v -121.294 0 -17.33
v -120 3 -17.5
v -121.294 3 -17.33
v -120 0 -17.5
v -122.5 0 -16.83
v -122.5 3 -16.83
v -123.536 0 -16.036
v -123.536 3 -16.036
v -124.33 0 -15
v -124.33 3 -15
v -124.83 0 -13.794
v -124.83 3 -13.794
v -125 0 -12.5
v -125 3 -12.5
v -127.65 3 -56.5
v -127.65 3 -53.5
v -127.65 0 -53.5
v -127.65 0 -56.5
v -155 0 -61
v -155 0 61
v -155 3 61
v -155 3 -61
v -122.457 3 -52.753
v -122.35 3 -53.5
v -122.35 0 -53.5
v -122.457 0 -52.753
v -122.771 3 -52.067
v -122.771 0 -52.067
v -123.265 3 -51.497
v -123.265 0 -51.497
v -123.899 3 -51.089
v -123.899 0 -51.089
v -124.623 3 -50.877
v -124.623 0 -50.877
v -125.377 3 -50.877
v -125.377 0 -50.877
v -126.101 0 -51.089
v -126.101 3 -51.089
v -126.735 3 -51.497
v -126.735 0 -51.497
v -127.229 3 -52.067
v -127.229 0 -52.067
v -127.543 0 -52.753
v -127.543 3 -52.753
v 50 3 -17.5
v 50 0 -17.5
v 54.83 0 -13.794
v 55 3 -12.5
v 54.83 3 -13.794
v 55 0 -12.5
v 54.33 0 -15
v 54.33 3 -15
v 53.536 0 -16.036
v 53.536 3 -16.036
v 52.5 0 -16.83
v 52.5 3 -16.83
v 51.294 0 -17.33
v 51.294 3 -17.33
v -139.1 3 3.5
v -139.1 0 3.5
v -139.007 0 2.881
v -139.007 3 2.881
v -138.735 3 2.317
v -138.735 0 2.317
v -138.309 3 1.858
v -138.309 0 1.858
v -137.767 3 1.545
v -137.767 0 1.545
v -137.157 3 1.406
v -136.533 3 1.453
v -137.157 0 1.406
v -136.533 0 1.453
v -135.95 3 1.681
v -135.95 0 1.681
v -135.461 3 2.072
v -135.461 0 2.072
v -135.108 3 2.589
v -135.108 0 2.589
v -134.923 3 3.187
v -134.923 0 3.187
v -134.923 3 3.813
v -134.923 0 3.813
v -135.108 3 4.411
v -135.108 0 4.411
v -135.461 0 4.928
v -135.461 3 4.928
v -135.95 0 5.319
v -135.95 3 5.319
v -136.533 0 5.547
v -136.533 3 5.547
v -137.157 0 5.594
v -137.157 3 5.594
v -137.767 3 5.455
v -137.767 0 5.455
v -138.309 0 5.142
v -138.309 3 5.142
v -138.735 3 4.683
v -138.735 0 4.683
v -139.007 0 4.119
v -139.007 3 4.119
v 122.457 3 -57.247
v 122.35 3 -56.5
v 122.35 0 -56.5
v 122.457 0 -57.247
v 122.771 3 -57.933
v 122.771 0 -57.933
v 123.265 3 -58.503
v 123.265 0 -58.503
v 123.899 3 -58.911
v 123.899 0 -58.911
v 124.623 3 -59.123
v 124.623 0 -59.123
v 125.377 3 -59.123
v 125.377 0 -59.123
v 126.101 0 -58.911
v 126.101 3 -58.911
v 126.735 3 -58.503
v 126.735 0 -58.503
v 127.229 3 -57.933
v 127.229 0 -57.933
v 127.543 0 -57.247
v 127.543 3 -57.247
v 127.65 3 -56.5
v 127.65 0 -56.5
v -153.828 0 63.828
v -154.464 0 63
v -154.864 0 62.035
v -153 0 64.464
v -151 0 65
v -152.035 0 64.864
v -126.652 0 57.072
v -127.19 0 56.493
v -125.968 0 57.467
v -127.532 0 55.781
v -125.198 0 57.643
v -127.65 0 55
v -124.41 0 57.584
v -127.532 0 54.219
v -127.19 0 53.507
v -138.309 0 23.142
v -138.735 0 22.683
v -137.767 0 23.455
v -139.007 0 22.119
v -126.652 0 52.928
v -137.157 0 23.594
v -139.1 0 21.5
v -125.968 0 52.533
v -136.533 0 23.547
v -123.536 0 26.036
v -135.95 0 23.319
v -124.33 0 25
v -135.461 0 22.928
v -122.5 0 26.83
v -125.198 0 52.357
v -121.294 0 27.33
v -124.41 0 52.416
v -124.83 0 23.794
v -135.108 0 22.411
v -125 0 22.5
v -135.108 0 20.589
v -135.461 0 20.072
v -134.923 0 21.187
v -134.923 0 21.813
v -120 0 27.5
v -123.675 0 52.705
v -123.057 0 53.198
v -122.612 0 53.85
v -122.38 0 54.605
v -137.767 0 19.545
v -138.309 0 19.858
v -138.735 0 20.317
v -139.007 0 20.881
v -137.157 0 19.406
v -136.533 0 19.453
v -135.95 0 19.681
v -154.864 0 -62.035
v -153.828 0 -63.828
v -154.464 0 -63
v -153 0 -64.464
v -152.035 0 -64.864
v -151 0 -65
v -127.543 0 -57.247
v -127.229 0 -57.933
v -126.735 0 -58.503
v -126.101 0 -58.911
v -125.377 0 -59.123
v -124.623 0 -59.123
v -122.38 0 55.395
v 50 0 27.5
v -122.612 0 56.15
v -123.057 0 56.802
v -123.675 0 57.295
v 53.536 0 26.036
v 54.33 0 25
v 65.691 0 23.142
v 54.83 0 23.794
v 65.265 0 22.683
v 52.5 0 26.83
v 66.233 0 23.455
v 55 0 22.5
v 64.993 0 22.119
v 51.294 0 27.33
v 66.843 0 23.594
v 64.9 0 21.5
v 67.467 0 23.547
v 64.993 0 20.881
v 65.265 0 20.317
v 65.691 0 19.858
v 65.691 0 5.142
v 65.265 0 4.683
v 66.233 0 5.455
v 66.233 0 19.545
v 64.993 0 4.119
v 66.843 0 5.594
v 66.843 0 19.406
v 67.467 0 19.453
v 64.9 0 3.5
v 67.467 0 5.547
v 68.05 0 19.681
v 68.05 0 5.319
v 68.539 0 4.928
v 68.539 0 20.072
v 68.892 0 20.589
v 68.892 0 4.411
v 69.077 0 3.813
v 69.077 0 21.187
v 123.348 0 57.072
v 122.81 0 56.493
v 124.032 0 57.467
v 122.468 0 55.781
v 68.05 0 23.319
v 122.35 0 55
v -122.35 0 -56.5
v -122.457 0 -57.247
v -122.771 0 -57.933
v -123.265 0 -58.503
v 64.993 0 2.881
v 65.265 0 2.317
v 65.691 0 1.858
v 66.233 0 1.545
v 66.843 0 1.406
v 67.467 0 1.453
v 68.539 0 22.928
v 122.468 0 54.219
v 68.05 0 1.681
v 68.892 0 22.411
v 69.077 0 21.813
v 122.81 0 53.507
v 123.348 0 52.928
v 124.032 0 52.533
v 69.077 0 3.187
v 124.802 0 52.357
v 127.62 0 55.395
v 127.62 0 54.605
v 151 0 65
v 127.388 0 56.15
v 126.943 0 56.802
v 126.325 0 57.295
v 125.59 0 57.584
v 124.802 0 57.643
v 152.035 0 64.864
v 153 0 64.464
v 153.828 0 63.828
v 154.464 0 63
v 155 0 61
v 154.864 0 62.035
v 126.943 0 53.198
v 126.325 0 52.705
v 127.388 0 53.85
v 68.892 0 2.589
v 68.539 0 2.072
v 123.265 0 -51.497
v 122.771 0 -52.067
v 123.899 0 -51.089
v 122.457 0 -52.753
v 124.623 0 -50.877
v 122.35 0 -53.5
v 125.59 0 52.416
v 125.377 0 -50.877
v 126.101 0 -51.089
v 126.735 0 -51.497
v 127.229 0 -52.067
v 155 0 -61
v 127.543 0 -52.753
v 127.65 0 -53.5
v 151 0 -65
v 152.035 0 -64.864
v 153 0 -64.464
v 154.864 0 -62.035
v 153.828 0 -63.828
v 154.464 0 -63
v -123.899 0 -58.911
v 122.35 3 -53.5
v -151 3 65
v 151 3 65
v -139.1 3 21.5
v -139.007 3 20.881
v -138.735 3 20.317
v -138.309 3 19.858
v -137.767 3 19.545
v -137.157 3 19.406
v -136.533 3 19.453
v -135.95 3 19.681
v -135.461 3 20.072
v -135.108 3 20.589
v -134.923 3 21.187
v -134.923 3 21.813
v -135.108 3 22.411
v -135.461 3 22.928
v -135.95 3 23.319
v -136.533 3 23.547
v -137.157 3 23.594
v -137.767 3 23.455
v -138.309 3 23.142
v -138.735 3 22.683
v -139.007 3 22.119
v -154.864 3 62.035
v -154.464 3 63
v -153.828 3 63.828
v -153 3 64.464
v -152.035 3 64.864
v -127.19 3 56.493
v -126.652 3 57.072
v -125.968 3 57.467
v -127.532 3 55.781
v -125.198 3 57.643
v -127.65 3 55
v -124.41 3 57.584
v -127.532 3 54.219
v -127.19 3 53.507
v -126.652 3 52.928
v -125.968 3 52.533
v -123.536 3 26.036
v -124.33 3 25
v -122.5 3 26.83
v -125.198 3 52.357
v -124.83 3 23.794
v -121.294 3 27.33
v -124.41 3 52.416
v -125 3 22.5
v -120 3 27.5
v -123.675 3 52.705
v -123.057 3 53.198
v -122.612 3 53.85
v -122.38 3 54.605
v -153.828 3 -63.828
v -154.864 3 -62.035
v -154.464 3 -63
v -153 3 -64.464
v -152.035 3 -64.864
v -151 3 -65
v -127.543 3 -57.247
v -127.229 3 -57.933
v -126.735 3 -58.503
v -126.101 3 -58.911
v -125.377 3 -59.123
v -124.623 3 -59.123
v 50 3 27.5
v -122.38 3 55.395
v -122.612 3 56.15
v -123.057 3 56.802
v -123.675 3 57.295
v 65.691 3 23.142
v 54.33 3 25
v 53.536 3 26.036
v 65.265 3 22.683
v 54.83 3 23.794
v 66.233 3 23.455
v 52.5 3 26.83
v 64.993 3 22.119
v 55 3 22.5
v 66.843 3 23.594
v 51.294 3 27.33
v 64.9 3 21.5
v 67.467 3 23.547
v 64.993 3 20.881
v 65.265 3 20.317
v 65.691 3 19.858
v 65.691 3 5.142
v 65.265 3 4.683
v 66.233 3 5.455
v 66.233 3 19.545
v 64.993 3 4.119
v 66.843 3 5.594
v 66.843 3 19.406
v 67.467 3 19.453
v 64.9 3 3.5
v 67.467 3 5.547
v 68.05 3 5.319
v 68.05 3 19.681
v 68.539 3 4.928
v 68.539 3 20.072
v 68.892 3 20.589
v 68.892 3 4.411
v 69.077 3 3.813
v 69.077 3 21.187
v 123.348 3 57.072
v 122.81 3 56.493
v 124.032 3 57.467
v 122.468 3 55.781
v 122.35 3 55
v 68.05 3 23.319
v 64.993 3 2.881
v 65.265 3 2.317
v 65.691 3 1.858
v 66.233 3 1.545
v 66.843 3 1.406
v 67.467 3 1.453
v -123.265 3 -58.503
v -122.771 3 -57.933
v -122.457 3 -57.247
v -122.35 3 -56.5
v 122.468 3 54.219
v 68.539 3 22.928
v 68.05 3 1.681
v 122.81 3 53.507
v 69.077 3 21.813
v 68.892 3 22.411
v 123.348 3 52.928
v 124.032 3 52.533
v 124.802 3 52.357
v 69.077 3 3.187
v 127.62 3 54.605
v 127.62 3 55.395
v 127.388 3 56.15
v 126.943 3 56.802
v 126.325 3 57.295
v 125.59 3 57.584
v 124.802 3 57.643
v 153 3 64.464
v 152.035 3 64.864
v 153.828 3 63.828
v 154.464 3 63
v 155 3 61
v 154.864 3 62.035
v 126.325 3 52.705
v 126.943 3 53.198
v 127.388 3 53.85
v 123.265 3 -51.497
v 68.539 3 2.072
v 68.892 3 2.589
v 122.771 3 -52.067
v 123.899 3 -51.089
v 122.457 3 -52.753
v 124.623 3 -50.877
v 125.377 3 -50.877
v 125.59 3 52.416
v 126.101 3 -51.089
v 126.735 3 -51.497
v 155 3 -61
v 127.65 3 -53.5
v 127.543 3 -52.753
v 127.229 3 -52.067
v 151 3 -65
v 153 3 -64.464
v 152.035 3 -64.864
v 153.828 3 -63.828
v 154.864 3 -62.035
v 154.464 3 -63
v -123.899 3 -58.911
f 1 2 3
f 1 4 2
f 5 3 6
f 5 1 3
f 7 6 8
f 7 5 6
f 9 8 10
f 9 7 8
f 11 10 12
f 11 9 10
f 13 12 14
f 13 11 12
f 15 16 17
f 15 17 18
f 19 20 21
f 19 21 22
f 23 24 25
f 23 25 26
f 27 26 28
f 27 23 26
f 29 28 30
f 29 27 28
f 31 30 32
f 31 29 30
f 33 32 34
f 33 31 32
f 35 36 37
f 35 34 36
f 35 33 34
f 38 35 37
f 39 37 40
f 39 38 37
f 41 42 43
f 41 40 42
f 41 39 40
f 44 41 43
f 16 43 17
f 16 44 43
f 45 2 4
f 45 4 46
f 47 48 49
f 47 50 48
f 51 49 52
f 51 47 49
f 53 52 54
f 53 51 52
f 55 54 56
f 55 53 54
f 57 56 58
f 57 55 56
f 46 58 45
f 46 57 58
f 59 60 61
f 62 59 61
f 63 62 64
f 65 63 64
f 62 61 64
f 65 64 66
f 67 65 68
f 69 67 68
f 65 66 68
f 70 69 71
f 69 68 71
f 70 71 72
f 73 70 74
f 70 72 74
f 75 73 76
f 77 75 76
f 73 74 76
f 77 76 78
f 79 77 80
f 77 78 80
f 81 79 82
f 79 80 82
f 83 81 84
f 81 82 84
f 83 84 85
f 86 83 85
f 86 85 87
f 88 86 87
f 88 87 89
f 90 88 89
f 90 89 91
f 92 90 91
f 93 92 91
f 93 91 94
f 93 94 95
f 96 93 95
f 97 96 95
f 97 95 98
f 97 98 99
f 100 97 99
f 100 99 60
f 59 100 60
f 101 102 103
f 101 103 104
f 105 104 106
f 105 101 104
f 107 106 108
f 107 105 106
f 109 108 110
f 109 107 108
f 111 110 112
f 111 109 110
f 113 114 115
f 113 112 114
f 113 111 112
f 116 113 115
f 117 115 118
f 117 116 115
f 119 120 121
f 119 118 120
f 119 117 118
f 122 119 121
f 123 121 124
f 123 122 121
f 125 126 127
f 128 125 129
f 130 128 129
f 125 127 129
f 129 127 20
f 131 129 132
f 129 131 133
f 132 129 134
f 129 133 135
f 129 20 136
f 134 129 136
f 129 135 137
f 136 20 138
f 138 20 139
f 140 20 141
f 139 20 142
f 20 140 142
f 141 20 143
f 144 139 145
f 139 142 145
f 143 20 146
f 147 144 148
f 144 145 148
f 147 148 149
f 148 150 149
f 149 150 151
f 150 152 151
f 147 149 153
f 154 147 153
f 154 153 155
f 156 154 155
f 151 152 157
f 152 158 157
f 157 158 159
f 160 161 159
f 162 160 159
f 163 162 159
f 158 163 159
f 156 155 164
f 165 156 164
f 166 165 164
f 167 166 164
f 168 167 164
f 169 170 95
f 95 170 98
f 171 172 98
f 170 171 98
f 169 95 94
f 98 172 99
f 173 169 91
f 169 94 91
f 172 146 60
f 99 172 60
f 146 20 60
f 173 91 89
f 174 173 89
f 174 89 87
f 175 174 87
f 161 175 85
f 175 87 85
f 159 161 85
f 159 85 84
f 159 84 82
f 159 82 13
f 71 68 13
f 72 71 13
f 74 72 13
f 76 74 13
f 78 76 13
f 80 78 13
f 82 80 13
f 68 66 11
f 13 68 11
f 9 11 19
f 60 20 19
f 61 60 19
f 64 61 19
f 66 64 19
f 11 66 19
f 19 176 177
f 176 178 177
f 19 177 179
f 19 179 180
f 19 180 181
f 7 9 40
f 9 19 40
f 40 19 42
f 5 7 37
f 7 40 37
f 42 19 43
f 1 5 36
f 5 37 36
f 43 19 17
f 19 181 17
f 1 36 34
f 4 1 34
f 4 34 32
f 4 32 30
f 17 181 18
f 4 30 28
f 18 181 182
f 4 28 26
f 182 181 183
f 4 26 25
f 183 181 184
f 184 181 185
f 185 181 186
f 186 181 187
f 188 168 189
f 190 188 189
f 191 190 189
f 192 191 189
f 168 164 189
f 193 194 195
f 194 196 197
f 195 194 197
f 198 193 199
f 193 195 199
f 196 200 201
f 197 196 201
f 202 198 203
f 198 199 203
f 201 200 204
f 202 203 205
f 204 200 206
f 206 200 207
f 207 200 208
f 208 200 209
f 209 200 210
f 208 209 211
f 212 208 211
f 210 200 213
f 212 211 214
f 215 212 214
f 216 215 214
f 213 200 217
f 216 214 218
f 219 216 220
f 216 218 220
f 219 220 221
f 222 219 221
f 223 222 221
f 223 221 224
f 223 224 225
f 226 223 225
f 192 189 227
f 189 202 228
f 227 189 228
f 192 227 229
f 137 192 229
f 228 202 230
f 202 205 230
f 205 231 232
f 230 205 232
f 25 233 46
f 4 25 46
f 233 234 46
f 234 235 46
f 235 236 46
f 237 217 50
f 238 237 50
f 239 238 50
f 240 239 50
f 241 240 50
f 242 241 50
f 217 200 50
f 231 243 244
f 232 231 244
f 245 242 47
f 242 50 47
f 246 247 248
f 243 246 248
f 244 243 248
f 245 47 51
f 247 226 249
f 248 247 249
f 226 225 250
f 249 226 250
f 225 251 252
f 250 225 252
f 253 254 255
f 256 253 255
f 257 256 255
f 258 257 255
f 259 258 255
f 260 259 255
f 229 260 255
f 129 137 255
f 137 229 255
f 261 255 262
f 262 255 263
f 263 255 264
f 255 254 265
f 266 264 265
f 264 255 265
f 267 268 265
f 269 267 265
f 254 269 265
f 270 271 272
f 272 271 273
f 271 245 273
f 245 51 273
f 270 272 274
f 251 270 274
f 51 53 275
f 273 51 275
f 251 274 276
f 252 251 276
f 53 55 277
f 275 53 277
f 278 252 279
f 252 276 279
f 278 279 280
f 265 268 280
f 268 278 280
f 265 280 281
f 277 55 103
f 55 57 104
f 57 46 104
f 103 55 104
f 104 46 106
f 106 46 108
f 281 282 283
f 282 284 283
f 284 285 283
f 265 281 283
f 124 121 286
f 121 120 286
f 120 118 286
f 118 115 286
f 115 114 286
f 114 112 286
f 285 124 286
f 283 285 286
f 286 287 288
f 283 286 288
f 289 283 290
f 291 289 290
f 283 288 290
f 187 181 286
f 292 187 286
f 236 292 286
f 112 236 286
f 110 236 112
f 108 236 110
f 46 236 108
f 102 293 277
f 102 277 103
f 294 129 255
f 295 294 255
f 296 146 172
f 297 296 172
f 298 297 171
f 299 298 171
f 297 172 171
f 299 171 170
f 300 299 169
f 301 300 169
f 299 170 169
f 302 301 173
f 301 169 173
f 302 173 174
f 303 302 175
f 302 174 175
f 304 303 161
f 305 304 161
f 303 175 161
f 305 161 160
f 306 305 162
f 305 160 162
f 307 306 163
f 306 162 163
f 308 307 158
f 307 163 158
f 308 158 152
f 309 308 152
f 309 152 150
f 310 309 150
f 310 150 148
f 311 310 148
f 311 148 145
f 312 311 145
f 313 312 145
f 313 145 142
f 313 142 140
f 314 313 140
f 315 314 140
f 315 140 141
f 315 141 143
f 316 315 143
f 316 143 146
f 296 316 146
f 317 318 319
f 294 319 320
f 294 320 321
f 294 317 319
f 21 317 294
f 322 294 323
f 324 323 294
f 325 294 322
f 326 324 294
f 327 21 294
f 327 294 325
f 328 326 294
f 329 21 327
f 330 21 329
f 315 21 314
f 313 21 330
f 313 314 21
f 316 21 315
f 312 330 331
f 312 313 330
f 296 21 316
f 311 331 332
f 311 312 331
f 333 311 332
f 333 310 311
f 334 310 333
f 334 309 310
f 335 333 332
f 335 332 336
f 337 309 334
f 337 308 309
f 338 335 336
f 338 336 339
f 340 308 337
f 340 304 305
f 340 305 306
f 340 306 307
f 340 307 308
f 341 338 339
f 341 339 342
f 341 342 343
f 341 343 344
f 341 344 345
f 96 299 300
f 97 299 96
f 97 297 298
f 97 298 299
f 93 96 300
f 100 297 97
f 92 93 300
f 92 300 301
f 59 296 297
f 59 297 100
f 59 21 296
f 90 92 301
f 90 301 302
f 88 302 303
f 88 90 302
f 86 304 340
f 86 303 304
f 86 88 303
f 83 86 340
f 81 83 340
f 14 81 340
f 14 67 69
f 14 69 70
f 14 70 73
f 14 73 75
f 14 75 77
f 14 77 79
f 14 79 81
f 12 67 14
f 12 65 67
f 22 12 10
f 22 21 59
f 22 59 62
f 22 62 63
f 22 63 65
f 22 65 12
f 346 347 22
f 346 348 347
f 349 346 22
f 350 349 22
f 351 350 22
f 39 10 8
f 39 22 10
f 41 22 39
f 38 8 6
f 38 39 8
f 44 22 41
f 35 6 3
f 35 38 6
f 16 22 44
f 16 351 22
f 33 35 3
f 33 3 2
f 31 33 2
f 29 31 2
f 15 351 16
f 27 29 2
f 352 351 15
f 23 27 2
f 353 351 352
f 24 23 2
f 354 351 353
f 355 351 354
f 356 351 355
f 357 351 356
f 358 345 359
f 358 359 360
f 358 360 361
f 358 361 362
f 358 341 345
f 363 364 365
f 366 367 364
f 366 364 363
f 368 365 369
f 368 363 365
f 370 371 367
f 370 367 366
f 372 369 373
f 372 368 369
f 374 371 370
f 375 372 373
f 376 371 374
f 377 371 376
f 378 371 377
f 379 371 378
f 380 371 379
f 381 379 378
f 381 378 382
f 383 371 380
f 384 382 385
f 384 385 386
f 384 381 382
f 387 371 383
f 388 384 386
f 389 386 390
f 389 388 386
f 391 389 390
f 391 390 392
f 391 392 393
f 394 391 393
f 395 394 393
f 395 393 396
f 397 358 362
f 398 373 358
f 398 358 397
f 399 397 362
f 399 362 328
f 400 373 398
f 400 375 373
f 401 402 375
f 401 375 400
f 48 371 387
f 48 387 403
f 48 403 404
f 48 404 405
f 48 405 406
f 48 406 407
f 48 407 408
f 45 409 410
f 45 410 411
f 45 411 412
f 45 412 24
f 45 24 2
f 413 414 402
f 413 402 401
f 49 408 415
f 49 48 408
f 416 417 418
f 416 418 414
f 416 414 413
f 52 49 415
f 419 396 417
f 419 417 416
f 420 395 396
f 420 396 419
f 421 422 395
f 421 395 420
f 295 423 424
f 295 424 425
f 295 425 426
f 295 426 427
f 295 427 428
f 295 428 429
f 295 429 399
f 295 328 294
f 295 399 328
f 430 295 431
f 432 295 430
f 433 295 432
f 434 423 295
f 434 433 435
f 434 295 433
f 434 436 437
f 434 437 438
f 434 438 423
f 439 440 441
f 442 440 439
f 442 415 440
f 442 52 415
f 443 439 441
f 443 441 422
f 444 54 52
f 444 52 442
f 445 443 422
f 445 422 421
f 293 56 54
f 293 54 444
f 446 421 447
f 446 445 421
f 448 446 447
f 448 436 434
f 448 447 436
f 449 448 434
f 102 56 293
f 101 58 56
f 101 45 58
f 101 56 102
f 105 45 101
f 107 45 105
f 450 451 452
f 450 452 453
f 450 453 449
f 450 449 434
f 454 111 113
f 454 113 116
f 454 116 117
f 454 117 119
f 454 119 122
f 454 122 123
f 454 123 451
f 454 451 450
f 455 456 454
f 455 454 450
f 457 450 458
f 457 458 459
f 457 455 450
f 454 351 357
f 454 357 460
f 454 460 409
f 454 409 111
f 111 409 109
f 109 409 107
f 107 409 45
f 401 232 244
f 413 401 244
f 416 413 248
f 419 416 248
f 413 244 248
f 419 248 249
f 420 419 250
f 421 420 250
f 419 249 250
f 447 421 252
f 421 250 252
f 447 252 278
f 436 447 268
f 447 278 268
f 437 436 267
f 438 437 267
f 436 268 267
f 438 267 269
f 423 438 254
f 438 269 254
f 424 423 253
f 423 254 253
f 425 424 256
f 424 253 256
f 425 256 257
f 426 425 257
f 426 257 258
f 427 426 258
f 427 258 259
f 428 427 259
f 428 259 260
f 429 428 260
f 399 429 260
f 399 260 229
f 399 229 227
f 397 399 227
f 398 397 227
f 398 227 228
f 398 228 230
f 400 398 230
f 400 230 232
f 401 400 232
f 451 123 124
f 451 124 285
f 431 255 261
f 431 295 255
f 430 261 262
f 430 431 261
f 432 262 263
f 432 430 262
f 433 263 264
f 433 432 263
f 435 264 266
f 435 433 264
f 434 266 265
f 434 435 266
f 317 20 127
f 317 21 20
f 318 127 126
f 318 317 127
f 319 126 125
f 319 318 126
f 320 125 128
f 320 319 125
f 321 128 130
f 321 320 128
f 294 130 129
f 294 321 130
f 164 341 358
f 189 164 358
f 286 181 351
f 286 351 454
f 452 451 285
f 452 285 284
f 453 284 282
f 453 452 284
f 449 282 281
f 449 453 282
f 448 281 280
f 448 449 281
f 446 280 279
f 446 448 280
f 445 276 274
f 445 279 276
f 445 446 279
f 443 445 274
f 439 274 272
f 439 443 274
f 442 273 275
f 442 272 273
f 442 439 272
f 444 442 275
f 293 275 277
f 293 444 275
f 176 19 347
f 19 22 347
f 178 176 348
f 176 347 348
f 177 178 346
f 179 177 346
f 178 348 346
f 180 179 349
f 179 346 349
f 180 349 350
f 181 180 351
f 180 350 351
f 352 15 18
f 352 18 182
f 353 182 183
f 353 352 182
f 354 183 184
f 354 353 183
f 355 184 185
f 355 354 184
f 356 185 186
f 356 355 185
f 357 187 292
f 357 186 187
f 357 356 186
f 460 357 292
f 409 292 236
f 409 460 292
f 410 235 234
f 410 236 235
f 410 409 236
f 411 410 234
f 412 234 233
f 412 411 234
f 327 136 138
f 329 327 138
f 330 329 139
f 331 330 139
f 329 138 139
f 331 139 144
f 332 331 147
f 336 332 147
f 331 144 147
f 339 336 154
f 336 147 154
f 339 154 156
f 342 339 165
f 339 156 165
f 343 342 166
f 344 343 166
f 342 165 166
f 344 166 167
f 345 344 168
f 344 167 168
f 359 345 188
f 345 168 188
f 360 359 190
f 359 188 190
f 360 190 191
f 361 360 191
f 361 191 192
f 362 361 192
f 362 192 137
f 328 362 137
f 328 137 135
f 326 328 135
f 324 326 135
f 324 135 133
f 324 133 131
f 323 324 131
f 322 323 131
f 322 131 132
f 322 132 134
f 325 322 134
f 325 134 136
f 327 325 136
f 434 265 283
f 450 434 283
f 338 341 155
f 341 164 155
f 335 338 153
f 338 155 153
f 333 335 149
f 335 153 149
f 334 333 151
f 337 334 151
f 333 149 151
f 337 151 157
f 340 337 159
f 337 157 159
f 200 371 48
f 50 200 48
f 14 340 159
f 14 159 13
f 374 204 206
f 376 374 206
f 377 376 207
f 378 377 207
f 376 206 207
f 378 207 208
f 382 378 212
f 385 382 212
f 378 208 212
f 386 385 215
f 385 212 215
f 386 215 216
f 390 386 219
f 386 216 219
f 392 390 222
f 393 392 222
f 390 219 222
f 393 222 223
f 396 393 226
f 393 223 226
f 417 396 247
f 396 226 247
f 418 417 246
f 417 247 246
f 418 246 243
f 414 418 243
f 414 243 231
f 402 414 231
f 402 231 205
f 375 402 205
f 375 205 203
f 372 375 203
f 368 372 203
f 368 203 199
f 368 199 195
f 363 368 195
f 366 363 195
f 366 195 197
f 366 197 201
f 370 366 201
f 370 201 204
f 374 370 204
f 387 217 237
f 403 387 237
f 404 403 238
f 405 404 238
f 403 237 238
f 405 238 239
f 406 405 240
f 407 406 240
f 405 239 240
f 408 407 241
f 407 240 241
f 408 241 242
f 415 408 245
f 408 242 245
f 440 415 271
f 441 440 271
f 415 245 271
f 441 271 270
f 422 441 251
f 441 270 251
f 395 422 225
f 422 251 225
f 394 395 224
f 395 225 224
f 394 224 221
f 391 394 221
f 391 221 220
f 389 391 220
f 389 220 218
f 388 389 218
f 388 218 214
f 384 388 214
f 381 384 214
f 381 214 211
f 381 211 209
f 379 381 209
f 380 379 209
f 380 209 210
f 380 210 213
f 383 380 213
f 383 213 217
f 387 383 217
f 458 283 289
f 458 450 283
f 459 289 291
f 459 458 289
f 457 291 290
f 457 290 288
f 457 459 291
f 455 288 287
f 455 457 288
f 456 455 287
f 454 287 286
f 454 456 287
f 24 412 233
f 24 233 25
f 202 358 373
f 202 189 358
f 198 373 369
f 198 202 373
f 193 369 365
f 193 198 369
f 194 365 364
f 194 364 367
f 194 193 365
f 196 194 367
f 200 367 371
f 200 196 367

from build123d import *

# Parameters (mm, degrees)
SKETCH1_W                  = 310
SKETCH1_H                  = 130
BOSS_EXTRUDE1_DEPTH        = 3
FILLET1_R                  = 4
F_5_3_5_3_DIAMETER_HOLE1_D = 5.3
SKETCH6_W                  = 180
SKETCH6_H                  = 45
CUT_EXTRUDE1_DEPTH         = 4
FILLET2_R                  = 5
M5X0_8_TAPPED_HOLE1_D      = 4.2
CUT_EXTRUDE2_DEPTH         = 4


with BuildPart() as part:
    # Sketch1 → Boss-Extrude1 (new body)
    with BuildSketch(Plane(origin=(0, 0, 0), x_dir=(1, 0, 0), z_dir=(0, 1, 0))):
        Rectangle(SKETCH1_W, SKETCH1_H)
    extrude(amount=BOSS_EXTRUDE1_DEPTH)

    # Fillet1
    fillet1_edges = [part.edges().sort_by_distance(p)[0] for p in [
        (155, 1.5, 65),
        (-155, 1.5, 65),
        (-155, 1.5, -65),
        (155, 1.5, -65),
    ]]
    fillet(fillet1_edges, radius=FILLET1_R)

    # Ø5.3 (5.3) Diameter Hole1 (through all)
    with Locations(Plane(origin=(0, 3, 0), x_dir=(1, 0, 0), z_dir=(0, 1, 0))):
        with Locations((125, 55), (-125, -55), (-125, 55), (125, -55)):
            Hole(F_5_3_5_3_DIAMETER_HOLE1_D / 2)

    # Sketch6 → Cut-Extrude1 (cut, through all)
    with BuildSketch(Plane(origin=(0, 3, 0), x_dir=(1, 0, 0), z_dir=(0, 1, 0))):
        with Locations((-35, -5)):
            Rectangle(SKETCH6_W, SKETCH6_H)
    extrude(amount=-CUT_EXTRUDE1_DEPTH, mode=Mode.SUBTRACT)

    # Fillet2
    fillet2_edges = [part.edges().sort_by_distance(p)[0] for p in [
        (55, 1.5, -17.5),
        (55, 1.5, 27.5),
        (-125, 1.5, 27.5),
        (-125, 1.5, -17.5),
    ]]
    fillet(fillet2_edges, radius=FILLET2_R)

    # M5x0.8 Tapped Hole1 (through all)
    with Locations(Plane(origin=(0, 3, 0), x_dir=(1, 0, 0), z_dir=(0, 1, 0))):
        with Locations((67, -3.5), (-137, -21.5), (-137, -3.5), (67, -21.5)):
            Hole(M5X0_8_TAPPED_HOLE1_D / 2)

    # Sketch9 → Cut-Extrude2 (cut, through all)
    with BuildSketch(Plane(origin=(0, 3, 0), x_dir=(1, 0, 0), z_dir=(0, 1, 0))):
        with BuildLine():
            Line((-127.65, 53.5), (-127.65, 56.5))
            ThreePointArc((-127.65, 56.5), (-125, 59.15), (-122.35, 56.5))
            Line((-122.35, 56.5), (-122.35, 53.5))
            ThreePointArc((-122.35, 53.5), (-125, 50.85), (-127.65, 53.5))
        make_face()
        with BuildLine():
            Line((122.35, 53.5), (122.35, 56.5))
            ThreePointArc((122.35, 56.5), (125, 59.15), (127.65, 56.5))
            Line((127.65, 56.5), (127.65, 53.5))
            ThreePointArc((127.65, 53.5), (125, 50.85), (122.35, 53.5))
        make_face()
    extrude(amount=-CUT_EXTRUDE2_DEPTH, mode=Mode.SUBTRACT)


solid = part.part
